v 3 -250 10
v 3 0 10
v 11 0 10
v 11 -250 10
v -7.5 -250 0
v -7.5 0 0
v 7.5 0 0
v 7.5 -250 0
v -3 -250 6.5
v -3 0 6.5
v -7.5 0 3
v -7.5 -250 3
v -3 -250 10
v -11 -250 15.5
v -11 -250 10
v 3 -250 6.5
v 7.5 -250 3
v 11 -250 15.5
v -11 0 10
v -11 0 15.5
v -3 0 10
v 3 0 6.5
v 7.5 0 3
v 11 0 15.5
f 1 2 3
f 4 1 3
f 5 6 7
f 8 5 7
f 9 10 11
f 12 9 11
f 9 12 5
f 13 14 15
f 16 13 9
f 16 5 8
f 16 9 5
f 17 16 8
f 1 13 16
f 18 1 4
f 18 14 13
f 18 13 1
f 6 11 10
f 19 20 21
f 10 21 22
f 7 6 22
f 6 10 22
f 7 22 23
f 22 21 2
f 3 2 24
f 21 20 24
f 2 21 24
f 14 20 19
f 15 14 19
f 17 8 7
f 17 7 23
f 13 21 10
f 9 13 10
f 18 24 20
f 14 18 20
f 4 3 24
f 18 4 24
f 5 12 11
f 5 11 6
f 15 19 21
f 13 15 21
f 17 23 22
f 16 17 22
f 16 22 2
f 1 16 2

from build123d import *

# Parameters (mm, degrees)
F1_DEPTH = 250


with BuildPart() as f1:
    # F0 (on Front) → F1 (new body)
    with BuildSketch(Plane.XZ):
        Polygon((3, 3), (7.5, 3), (3, 6.5), align=None)
        Polygon((-3, 6.5), (-7.5, 3), (-3, 3), align=None)
        Polygon((-3, 10), (0, 10), (0, 15.5), (-11, 15.5), (-11, 10), align=None)
        Polygon((0, 15.5), (0, 10), (3, 10), (11, 10), (11, 15.5), align=None)
        Polygon((0, 0), (7.5, 0), (7.5, 3), (3, 3), (0, 3), align=None)
        Polygon((-7.5, 0), (0, 0), (0, 3), (-3, 3), (-7.5, 3), align=None)
        Polygon((-3, 3), (0, 3), (0, 10), (-3, 10), (-3, 6.5), align=None)
        Polygon((0, 10), (0, 3), (3, 3), (3, 6.5), (3, 10), align=None)
    extrude(amount=F1_DEPTH)


solid = f1.part
